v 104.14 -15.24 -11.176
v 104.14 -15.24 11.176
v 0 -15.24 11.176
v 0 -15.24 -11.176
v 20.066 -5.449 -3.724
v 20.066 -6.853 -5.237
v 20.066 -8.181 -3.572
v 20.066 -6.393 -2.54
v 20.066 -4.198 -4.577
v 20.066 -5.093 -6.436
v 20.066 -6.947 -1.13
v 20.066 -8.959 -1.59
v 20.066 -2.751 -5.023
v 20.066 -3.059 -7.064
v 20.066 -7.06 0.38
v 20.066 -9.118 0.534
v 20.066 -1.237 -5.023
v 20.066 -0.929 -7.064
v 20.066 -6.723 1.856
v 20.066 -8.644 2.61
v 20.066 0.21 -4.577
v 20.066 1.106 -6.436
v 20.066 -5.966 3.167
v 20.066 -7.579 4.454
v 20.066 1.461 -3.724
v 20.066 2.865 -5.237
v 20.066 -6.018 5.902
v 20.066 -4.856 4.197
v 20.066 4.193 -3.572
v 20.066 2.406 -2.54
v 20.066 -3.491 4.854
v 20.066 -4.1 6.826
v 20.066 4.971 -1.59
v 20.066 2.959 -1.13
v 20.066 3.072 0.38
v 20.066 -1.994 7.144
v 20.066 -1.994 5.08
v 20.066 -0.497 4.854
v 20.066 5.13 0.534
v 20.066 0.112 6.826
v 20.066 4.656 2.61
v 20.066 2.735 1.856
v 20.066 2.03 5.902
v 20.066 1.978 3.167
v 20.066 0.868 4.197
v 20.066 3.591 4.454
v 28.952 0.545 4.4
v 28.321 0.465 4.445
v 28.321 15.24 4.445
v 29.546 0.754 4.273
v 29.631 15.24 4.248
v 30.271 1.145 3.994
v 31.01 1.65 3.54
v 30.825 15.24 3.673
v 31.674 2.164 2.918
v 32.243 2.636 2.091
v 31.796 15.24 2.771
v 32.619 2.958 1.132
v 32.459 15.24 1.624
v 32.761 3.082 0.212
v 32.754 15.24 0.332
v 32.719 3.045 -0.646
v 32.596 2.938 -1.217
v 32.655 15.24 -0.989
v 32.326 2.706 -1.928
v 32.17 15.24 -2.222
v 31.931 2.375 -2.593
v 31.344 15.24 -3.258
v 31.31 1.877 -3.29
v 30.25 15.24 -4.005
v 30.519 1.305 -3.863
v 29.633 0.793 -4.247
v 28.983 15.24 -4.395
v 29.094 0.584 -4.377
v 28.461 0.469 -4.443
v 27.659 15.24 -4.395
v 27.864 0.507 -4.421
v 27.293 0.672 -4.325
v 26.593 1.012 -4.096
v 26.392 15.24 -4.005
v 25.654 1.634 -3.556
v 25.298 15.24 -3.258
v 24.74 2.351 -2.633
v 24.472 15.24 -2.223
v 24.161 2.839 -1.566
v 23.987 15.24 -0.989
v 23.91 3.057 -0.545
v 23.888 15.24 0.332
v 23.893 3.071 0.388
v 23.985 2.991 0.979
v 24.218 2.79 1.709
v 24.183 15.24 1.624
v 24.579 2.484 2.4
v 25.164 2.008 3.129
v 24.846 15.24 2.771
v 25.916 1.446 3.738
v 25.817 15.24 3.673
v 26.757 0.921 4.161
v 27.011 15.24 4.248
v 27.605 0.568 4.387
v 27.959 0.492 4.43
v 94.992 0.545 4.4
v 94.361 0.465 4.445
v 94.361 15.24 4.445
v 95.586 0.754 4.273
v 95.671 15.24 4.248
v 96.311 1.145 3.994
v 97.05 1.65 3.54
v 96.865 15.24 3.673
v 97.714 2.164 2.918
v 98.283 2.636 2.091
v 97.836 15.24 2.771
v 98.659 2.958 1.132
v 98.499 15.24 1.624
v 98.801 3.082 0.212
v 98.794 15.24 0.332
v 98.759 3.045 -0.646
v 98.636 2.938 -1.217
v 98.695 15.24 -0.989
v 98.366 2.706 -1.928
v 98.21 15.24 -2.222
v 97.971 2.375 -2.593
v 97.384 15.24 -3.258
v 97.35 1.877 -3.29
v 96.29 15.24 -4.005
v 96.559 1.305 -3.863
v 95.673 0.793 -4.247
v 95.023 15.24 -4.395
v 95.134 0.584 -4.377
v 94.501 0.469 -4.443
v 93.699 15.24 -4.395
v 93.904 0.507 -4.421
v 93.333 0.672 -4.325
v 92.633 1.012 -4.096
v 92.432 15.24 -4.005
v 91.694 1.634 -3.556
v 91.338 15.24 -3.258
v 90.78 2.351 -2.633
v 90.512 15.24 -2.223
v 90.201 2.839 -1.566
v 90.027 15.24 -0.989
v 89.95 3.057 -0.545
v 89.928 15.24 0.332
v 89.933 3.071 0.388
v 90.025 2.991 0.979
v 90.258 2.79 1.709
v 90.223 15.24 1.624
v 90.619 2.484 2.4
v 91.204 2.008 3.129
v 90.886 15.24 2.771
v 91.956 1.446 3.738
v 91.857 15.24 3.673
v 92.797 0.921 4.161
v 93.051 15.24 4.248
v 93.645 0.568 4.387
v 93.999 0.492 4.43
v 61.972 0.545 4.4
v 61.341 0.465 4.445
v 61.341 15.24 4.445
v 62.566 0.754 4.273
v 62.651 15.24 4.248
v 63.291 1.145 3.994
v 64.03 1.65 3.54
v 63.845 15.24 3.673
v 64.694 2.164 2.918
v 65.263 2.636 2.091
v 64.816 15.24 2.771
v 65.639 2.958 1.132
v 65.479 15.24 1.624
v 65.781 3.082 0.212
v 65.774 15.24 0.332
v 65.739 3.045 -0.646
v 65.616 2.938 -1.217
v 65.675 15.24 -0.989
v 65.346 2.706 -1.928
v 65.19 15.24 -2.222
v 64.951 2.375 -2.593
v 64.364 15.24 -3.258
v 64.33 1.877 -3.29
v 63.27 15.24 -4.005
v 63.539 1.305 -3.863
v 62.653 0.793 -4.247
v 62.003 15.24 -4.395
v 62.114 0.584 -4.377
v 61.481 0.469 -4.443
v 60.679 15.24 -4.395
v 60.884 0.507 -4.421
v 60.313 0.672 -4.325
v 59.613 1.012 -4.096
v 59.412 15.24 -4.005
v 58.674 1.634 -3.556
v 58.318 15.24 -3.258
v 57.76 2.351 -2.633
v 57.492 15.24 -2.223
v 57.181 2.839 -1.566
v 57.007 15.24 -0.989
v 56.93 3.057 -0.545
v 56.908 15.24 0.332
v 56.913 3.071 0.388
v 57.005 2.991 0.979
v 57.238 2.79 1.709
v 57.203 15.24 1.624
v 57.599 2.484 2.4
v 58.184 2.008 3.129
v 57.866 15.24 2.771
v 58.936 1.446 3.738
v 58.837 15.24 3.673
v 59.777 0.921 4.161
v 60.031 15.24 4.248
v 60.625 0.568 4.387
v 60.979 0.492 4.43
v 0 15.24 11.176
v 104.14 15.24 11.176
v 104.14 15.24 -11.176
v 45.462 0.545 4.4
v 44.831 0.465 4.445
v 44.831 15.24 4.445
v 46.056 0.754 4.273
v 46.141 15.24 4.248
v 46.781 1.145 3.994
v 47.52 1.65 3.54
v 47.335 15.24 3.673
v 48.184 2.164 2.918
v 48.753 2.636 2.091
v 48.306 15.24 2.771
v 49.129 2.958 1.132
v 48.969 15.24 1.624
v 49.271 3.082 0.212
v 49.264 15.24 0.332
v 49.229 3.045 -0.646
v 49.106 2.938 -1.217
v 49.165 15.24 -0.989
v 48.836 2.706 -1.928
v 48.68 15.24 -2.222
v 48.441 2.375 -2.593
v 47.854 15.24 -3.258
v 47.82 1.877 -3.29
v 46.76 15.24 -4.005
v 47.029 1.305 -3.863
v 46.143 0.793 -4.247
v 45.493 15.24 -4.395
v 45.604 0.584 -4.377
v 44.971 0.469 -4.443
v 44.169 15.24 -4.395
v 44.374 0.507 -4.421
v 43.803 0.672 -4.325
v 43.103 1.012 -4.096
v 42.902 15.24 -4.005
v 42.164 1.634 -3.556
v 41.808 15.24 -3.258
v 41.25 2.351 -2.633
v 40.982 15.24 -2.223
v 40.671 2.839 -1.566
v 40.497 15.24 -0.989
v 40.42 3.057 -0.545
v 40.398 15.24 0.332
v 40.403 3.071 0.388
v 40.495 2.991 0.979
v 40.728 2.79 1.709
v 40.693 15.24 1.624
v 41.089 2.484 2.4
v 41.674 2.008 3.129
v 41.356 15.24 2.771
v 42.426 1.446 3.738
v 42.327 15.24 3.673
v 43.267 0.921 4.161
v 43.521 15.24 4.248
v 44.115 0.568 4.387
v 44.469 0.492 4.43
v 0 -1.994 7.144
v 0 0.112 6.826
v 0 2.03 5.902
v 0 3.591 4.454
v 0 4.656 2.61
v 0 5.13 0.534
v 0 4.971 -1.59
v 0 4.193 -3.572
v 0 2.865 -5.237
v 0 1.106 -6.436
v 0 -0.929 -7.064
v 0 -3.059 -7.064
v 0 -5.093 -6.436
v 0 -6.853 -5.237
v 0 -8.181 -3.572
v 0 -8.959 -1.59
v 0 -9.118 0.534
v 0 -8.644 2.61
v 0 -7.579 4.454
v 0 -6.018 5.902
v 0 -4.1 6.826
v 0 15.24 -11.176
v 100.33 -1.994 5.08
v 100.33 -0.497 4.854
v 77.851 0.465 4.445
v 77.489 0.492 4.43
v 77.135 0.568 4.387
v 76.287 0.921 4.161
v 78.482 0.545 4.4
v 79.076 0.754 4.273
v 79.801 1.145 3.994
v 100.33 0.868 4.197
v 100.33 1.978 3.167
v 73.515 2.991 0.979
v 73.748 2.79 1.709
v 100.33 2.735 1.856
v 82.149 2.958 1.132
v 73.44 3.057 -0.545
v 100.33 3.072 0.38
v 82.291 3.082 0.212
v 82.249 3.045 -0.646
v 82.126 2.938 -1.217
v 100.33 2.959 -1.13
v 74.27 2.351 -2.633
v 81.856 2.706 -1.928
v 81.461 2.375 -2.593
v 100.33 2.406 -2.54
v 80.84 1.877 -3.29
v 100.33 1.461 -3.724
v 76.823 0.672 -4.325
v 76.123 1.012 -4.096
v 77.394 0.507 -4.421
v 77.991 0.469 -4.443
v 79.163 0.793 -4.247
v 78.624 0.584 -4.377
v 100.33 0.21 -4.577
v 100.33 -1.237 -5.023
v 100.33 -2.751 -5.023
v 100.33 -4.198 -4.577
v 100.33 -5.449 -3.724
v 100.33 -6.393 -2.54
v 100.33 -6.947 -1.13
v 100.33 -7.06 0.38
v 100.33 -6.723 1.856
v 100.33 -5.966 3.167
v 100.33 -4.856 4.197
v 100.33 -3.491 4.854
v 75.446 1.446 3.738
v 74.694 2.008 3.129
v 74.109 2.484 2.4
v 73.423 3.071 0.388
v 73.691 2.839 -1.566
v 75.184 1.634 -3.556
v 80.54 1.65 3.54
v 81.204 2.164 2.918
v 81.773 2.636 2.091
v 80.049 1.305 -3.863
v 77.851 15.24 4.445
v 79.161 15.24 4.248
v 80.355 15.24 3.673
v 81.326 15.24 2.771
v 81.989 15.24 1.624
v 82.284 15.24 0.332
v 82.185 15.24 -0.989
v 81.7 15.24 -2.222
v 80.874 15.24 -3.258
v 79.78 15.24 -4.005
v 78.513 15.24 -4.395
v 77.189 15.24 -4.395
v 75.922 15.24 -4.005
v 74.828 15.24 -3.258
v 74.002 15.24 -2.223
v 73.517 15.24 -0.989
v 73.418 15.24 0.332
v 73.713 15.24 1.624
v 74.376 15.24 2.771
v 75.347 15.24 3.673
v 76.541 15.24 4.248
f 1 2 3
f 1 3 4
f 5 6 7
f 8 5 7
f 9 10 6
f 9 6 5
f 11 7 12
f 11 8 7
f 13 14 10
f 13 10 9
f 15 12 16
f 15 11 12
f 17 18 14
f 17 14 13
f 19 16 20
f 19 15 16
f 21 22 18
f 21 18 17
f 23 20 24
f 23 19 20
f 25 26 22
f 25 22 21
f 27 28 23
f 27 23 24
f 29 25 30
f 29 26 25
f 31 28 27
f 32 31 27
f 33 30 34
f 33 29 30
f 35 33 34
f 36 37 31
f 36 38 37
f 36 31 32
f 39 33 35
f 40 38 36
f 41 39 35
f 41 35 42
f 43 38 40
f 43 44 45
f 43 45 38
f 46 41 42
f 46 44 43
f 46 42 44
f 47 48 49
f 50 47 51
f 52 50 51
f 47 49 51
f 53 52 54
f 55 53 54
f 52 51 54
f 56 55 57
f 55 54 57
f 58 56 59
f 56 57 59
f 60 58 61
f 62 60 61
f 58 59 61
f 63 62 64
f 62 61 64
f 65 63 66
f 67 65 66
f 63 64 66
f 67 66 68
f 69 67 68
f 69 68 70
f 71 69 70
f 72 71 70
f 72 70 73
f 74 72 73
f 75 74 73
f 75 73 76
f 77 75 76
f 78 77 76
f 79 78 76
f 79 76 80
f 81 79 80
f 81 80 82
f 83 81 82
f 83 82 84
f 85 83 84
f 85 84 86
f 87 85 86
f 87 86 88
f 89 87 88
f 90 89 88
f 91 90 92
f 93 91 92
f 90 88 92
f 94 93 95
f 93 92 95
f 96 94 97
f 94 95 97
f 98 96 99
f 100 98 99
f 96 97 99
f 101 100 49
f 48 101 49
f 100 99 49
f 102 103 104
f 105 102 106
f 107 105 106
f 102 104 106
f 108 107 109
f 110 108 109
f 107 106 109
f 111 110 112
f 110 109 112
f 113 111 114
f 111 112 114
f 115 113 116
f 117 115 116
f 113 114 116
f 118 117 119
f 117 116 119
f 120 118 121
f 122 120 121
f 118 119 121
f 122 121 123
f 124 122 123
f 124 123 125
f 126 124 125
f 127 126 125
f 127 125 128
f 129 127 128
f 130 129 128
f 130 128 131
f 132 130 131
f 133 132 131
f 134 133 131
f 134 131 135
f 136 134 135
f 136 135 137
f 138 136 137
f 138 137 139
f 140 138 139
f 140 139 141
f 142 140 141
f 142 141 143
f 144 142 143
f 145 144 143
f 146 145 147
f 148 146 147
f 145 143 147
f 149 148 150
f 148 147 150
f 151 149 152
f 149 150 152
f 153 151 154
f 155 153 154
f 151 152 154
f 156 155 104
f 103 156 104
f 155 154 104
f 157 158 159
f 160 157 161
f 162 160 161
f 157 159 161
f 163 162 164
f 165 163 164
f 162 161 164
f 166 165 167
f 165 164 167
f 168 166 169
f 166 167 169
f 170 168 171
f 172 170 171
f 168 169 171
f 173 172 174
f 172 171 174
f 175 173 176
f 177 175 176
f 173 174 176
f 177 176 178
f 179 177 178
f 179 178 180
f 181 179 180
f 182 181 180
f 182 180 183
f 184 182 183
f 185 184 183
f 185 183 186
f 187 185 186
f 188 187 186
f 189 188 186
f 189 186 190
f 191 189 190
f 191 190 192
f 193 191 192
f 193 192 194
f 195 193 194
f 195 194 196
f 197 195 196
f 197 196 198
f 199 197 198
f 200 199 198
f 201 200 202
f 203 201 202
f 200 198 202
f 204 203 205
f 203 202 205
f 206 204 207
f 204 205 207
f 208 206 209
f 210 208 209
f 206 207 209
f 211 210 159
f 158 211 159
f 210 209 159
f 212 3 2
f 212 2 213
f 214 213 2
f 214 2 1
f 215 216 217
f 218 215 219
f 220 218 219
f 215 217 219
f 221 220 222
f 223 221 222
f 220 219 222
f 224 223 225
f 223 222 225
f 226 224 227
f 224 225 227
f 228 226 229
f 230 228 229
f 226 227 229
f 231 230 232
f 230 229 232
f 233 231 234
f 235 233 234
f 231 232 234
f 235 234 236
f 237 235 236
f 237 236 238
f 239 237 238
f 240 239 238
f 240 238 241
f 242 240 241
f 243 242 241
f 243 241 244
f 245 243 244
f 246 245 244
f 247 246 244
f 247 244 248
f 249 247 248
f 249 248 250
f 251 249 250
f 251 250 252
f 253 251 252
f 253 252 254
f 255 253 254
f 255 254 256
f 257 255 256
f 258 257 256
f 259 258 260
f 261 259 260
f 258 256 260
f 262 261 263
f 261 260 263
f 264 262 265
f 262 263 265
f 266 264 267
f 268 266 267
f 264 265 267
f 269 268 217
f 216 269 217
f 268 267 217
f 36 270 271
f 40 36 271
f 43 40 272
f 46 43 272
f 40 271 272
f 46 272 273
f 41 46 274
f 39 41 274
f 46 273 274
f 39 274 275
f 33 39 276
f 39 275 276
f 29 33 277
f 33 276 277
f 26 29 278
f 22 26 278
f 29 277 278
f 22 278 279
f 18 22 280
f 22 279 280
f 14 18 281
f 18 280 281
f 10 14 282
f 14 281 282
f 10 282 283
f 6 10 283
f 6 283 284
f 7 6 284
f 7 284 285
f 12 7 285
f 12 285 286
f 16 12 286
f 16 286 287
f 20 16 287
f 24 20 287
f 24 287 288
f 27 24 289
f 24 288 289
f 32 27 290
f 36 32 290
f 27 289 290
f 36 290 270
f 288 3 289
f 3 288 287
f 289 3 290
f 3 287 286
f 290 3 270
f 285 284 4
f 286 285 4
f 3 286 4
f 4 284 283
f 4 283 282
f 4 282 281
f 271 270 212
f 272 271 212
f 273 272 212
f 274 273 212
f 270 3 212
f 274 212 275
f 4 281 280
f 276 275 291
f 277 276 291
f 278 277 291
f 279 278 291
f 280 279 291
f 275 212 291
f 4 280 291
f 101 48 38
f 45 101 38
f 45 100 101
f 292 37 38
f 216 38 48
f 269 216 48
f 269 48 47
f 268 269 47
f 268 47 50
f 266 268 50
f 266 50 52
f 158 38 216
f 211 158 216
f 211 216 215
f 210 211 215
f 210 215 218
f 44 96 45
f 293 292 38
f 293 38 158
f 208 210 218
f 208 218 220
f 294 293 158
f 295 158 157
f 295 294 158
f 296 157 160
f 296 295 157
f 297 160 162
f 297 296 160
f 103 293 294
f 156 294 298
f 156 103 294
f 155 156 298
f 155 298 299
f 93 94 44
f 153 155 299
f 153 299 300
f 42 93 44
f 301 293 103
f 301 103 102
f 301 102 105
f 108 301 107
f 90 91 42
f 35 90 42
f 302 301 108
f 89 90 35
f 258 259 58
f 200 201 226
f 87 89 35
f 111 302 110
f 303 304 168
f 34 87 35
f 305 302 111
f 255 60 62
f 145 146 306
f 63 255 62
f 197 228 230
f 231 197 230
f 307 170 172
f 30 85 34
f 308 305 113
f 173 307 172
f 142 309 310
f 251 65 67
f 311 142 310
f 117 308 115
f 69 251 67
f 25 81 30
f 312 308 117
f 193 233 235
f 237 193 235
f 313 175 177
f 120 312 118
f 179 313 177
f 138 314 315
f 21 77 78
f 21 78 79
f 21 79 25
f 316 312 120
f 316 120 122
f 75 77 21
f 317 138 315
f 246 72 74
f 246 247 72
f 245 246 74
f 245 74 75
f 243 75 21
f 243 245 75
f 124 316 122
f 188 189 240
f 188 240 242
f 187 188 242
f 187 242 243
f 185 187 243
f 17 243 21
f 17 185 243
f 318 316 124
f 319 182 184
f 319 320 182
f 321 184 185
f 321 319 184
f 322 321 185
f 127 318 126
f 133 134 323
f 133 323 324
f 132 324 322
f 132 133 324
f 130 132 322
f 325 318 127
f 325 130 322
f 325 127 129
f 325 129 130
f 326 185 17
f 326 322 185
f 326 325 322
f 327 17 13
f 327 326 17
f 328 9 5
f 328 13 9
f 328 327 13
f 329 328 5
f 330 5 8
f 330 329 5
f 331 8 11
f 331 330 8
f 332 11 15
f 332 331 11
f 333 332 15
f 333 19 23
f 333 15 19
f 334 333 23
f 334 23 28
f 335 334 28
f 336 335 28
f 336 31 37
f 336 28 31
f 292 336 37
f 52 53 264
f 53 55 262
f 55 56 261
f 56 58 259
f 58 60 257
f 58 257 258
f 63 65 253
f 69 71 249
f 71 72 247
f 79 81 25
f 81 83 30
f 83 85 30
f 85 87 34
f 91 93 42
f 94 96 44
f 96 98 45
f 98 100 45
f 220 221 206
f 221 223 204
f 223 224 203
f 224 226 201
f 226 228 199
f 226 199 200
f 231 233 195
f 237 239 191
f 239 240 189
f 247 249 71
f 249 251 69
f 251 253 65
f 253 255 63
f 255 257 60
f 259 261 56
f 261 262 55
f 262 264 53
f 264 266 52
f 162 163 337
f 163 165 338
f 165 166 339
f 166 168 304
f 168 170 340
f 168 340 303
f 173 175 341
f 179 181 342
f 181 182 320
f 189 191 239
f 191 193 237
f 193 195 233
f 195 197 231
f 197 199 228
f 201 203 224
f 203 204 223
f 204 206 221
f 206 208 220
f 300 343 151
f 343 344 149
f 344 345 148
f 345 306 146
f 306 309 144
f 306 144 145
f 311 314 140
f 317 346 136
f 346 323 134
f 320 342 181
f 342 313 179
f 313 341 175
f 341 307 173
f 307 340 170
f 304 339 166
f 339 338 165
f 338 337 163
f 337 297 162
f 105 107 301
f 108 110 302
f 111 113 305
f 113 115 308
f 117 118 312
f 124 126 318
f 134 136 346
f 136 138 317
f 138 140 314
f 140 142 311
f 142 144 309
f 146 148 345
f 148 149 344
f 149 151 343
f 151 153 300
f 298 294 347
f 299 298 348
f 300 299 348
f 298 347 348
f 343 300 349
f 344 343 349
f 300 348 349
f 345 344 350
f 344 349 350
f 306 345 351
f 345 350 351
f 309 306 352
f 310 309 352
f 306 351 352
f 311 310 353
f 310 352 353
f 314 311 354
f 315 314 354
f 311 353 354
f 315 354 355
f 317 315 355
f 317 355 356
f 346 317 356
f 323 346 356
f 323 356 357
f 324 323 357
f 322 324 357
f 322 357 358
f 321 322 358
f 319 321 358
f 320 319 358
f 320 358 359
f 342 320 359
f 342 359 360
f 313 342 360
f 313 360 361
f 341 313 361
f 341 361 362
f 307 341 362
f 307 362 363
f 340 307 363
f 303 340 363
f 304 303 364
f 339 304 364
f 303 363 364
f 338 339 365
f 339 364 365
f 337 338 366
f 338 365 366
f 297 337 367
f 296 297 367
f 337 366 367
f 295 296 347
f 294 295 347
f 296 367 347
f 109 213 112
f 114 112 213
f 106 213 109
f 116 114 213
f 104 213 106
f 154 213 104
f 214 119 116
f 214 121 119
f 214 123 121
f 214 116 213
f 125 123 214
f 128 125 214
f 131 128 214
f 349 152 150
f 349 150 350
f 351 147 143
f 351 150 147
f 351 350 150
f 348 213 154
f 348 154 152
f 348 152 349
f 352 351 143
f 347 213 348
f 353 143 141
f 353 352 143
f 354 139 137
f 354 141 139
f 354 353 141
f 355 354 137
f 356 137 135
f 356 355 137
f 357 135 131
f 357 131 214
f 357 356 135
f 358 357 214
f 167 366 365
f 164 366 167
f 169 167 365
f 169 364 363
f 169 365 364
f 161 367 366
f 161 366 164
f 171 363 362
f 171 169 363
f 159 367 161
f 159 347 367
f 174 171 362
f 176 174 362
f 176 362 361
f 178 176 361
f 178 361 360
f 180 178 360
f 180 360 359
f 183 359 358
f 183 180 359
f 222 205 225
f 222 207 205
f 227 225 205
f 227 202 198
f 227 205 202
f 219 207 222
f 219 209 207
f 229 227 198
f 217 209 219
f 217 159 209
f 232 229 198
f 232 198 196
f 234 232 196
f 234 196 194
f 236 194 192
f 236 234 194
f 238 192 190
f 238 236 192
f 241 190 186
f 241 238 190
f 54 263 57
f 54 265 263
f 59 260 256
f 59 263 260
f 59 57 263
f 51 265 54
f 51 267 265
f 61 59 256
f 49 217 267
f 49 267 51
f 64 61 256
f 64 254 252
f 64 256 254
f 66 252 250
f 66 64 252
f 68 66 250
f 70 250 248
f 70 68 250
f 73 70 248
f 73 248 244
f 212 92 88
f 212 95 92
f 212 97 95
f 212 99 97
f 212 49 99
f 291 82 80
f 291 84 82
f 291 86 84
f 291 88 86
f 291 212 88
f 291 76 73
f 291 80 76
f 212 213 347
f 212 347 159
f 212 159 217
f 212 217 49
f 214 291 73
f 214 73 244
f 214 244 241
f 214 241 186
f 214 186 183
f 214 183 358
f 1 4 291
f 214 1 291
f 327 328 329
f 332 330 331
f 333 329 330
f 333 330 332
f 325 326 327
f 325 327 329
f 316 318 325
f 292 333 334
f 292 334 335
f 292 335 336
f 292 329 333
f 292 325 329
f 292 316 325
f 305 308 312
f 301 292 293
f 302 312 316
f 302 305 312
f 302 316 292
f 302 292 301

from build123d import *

# Parameters (mm, degrees)
SKETCH4_W               = 22.352
SKETCH4_H               = 30.48
BOSS_EXTRUDE2_DEPTH     = 104.14
CUT_EXTRUDE2_START      = -100.33
SKETCH5_R               = 5.08
CUT_EXTRUDE2_DEPTH      = 100.33
CUT_EXTRUDE5_REACH      = 111.083
CUT_EXTRUDE5_END_RADIUS = 5.08
SKETCH9_R               = 4.445
LPATTERN1_COUNT         = 5
LPATTERN1_PITCH         = 16.51
SKETCH14_R              = 7.14375
CUT_EXTRUDE7_DEPTH      = 20.066


with BuildPart() as part:
    # Sketch4 → Boss-Extrude2 (new body)
    with BuildSketch(Plane(origin=(0, 0, 0), x_dir=(0, 0, -1), z_dir=(1, 0, 0))):
        Rectangle(SKETCH4_W, SKETCH4_H)
    extrude(amount=BOSS_EXTRUDE2_DEPTH)

    # Sketch5 → Cut-Extrude2 (cut)
    with BuildSketch(Plane.ZY.offset(CUT_EXTRUDE2_START)):
        with Locations((0, -1.9939)):
            Circle(SKETCH5_R)
    extrude(amount=CUT_EXTRUDE2_DEPTH, mode=Mode.SUBTRACT)

    # Cut-Extrude5: up to this cylinder (the profile starts outside it)
    cut_extrude5_end = Plane(origin=(28.321, -1.9939, 0), z_dir=(-1, 0, 0)) * Cylinder(CUT_EXTRUDE5_END_RADIUS, 233.326, mode=Mode.PRIVATE)
    # Sketch9 → Cut-Extrude5 (cut, up to the surface)
    with BuildSketch(Plane(origin=(0, 15.24, 0), x_dir=(1, 0, 0), z_dir=(0, 1, 0)), mode=Mode.PRIVATE) as cut_extrude5_sk1:
        with Locations(Location((28.321, 0, 0), (0, 0, 270))):
            Circle(SKETCH9_R)
    cut_extrude5_tool1 = extrude(cut_extrude5_sk1.sketch, amount=-CUT_EXTRUDE5_REACH, mode=Mode.PRIVATE) - cut_extrude5_end
    cut_extrude5 = cut_extrude5_tool1.solids().sort_by_distance((28.321, 15.24, 0))[0]
    add(cut_extrude5, mode=Mode.SUBTRACT)

    # LPattern1: Cut-Extrude5 ×5
    with Locations(*[(i * LPATTERN1_PITCH, 0, 0) for i in range(1, LPATTERN1_COUNT)]):
        add(cut_extrude5, mode=Mode.SUBTRACT)

    # Sketch14 → Cut-Extrude7 (cut)
    with BuildSketch(Plane.ZY):
        with Locations((0, -1.9939)):
            Circle(SKETCH14_R)
    extrude(amount=-CUT_EXTRUDE7_DEPTH, mode=Mode.SUBTRACT)


solid = part.part
